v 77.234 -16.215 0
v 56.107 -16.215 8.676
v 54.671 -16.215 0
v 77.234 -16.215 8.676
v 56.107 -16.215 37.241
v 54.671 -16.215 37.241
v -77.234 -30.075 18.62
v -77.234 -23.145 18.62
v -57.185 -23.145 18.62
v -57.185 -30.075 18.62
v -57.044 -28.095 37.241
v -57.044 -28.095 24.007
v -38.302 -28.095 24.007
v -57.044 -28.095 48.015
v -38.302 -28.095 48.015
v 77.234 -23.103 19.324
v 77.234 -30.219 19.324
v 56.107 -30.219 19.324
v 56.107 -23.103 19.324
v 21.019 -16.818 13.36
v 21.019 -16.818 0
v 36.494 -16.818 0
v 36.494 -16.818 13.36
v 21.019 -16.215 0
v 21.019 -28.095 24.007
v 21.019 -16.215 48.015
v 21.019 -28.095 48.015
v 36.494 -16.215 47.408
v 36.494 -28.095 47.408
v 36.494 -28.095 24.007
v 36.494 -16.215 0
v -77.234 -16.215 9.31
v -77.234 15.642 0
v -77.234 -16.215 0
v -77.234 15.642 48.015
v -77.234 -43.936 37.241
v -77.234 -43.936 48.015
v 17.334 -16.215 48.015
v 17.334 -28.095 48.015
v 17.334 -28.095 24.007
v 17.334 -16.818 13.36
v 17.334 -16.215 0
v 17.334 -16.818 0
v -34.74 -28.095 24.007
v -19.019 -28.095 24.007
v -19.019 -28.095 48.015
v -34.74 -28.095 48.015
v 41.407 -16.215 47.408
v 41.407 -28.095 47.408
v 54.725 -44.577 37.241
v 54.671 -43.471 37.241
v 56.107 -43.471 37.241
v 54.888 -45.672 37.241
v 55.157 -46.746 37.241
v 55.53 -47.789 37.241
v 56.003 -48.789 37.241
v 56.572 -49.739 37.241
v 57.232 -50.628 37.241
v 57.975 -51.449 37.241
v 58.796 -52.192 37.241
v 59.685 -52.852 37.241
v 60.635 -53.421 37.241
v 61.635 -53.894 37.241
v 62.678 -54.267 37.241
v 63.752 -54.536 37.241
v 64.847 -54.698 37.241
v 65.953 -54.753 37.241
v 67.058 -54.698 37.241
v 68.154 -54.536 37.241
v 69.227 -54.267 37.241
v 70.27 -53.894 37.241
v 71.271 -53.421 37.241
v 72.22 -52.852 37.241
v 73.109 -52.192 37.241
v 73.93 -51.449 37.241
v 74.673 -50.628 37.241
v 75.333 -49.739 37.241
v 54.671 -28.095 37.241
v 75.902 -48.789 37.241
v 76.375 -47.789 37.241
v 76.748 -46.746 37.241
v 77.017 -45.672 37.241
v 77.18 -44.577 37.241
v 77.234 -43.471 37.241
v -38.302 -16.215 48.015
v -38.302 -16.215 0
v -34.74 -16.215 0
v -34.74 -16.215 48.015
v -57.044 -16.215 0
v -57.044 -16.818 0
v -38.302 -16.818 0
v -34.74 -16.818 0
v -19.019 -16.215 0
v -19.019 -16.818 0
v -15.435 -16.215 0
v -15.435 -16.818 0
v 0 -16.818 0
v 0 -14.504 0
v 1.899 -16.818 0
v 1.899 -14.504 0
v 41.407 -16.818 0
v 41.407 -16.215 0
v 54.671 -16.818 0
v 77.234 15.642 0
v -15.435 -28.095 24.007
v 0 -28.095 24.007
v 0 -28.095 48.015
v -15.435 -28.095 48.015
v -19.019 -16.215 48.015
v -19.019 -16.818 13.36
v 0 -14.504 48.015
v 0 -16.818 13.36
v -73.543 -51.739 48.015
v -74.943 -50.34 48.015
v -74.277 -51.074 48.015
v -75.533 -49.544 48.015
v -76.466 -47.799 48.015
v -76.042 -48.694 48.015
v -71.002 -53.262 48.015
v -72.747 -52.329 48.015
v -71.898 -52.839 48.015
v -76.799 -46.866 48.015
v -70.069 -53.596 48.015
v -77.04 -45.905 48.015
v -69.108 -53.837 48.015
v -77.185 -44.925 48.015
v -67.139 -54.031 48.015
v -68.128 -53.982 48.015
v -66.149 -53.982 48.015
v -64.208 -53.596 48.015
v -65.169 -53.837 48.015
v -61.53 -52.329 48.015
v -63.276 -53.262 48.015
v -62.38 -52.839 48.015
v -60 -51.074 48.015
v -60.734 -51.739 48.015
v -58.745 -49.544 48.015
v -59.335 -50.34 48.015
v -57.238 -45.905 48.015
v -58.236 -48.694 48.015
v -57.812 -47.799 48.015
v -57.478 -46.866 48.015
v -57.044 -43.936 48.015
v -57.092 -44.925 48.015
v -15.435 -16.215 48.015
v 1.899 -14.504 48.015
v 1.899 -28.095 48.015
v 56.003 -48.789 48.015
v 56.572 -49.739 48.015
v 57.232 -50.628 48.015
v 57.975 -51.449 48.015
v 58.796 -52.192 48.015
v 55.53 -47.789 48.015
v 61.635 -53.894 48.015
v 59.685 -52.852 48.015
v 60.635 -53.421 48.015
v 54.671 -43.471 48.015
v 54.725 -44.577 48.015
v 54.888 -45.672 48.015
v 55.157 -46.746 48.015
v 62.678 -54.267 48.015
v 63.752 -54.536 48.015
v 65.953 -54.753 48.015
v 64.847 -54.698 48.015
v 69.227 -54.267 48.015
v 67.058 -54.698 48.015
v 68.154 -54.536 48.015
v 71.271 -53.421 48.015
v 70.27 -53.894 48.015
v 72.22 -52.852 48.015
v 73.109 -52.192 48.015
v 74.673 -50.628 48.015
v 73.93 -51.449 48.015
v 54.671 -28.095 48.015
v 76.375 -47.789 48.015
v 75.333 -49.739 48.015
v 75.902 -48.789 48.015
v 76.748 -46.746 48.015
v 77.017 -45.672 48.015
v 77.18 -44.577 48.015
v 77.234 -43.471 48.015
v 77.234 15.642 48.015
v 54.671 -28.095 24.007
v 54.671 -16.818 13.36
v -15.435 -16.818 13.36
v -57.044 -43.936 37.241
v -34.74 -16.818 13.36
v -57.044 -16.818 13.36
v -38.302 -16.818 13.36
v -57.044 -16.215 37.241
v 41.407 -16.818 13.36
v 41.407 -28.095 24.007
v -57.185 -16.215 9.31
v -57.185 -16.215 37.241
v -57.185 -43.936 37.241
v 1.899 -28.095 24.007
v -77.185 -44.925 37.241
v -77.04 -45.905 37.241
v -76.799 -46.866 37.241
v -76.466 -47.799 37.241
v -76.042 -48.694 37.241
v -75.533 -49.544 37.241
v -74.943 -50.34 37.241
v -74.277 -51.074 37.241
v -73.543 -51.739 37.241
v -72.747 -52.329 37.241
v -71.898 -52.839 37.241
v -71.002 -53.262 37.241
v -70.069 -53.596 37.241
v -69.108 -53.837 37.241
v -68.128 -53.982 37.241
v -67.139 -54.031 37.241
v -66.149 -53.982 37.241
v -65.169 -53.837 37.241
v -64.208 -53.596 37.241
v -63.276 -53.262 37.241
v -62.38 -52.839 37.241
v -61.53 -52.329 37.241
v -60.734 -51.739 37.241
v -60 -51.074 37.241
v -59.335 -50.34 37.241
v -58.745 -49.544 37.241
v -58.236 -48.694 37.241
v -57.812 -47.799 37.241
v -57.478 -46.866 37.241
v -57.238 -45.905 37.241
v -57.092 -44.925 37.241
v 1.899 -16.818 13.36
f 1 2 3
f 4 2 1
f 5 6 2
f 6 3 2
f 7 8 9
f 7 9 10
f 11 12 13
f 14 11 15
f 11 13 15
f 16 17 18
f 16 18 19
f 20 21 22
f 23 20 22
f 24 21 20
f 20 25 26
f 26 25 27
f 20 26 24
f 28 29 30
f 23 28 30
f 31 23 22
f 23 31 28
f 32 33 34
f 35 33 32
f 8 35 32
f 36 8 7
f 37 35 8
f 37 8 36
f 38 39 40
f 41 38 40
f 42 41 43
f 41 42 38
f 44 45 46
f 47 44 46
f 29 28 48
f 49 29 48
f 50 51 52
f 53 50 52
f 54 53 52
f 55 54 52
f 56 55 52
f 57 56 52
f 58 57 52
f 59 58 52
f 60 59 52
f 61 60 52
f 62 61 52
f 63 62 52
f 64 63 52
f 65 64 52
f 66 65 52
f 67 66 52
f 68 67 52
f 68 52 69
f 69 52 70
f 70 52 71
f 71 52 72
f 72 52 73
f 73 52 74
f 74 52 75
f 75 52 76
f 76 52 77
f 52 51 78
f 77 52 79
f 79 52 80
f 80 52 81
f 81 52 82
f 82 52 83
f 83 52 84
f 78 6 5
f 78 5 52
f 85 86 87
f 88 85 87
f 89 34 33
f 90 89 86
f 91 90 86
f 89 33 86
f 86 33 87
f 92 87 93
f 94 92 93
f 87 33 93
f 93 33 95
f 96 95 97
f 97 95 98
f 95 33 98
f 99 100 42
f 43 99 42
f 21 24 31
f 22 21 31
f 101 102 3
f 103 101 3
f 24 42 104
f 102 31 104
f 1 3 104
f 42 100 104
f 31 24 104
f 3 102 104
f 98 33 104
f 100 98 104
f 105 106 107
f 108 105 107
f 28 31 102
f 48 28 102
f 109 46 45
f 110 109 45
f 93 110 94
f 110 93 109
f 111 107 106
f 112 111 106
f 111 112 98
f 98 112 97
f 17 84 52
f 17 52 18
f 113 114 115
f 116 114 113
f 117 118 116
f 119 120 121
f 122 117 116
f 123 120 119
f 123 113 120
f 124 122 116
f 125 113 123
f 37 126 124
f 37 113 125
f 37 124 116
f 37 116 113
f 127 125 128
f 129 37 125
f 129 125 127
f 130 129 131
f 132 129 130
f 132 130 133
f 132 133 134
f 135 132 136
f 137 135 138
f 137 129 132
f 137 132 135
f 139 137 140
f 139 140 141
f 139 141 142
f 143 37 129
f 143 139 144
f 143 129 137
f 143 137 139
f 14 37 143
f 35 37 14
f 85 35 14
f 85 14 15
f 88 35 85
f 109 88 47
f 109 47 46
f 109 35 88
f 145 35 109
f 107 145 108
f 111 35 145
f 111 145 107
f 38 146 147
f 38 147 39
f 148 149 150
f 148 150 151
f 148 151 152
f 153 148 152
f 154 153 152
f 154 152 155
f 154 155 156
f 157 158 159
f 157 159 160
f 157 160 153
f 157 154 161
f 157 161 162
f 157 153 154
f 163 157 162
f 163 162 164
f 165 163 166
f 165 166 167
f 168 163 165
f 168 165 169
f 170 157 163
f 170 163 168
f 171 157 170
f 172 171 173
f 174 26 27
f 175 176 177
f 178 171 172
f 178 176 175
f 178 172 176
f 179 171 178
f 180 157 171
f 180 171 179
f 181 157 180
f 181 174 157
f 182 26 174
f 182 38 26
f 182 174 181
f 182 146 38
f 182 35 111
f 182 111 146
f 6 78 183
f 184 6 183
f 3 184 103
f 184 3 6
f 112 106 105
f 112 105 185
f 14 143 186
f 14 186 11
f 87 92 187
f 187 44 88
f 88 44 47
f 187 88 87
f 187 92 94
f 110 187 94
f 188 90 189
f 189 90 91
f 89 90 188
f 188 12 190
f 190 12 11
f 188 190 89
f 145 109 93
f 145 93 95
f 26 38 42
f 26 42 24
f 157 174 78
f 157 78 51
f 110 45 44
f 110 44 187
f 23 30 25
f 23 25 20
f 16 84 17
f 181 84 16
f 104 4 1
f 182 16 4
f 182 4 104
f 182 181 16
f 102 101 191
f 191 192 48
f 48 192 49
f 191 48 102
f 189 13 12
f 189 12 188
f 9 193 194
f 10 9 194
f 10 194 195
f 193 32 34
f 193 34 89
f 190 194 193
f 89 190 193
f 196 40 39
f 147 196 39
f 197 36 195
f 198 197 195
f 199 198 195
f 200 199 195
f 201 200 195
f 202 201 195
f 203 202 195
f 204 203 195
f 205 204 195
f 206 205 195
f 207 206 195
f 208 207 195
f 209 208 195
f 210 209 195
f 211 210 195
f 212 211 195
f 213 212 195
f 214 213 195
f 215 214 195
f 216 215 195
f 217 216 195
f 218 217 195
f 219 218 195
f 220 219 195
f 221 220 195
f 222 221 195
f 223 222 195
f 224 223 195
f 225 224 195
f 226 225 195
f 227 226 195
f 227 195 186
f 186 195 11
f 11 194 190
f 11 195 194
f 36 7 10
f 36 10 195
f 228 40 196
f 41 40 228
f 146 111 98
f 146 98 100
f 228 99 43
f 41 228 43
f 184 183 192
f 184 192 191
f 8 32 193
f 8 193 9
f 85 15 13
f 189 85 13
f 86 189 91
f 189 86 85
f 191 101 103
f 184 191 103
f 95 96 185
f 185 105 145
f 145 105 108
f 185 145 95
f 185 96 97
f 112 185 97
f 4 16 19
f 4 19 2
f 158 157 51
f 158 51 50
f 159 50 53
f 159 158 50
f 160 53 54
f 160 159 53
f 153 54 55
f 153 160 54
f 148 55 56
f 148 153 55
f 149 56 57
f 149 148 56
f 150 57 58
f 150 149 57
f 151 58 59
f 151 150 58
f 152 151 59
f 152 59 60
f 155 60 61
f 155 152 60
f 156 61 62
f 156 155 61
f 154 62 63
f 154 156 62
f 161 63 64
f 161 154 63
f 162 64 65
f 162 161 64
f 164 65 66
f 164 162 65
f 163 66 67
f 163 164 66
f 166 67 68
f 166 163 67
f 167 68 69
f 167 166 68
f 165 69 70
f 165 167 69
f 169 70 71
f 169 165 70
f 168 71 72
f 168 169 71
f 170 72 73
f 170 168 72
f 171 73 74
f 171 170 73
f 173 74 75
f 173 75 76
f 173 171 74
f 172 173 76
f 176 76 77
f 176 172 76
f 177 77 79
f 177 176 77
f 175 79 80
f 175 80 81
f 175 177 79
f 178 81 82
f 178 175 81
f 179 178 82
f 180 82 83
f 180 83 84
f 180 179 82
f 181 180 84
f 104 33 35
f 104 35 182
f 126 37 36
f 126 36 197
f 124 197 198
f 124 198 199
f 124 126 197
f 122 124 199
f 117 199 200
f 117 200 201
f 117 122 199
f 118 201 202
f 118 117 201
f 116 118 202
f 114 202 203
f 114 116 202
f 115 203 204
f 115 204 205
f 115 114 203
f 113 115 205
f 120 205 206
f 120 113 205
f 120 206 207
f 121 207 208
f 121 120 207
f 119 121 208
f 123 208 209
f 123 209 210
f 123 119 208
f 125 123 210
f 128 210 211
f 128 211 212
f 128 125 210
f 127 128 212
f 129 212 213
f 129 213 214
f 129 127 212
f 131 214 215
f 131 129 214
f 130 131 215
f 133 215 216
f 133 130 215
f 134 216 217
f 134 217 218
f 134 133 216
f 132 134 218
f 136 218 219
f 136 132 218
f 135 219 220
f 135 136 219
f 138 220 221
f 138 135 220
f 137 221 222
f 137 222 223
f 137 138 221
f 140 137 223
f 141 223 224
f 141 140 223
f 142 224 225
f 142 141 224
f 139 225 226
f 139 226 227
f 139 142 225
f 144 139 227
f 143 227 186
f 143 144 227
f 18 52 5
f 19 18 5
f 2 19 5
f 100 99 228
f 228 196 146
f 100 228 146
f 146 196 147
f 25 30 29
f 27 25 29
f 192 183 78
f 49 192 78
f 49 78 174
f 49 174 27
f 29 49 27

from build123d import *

# Parameters (mm, degrees)
F0_W      = 154.4681414962
F0_H      = 32.4599891901
F1_DEPTH  = 48.0146426708
F2_W      = 11.2775340676
F2_H      = 24.0073213354
F3_DEPTH  = 154.6795647591
F4_W      = 20.4018931836
F4_H      = 24.0073213354
F4_W_2    = 3.5617277026
F4_W_3    = 3.5835206509
F4_W_4    = 3.6845356226
F4_W_5    = 4.9127191305
F4_W_6    = 22.562906146
F4_H_2    = 23.4004920349
F5_DEPTH  = 11.8805598468
F7_DEPTH  = 10.7736643404
F9_DEPTH  = 20.0494788587
F11_DEPTH = 21.1268346757
F12_W     = 1.8992722034
F12_H     = 24.0073213354
F13_DEPTH = 13.5909728706


with BuildPart() as f1:
    # F0 (on Top) → F1 (new body)
    with BuildSketch(Plane.XY):
        with Locations((3.7253e-06, -0.5876496434)):
            Rectangle(F0_W, F0_H)
    extrude(amount=F1_DEPTH)

    # F2 (on face) → F3 (join)
    with BuildSketch(Plane.YZ.offset(77.2340744734)):
        with Locations((-22.4564112723, 36.0109820031)):
            Rectangle(F2_W, F2_H)
        Polygon((-16.8176442385, 13.3598086642), (-16.8176442385, 24.0073213354), (-28.0951783061, 24.0073213354), align=None)
    extrude(amount=-F3_DEPTH)

    # F4 (on face) → F5 (cut)
    with BuildSketch(Plane.XZ.offset(28.0951783061)):
        with Locations((-67.244543694, 12.0036606677)):
            Rectangle(F4_W, F4_H)
        with Locations((-67.244543694, 36.0109820031)):
            Rectangle(F4_W, F4_H)
        with Locations((-36.5212969482, 12.0036606677)):
            Rectangle(F4_W_2, F4_H)
        with Locations((-36.5212969482, 36.0109820031)):
            Rectangle(F4_W_2, F4_H)
        with Locations((-17.2269493341, 36.0109820031)):
            Rectangle(F4_W_3, F4_H)
        with Locations((-17.2269493341, 12.0036606677)):
            Rectangle(F4_W_3, F4_H)
        with Locations((19.1767290235, 36.0109820031)):
            Rectangle(F4_W_4, F4_H)
        with Locations((19.1767290235, 12.0036606677)):
            Rectangle(F4_W_4, F4_H)
        with Locations((38.9504507184, 12.0036606677)):
            Rectangle(F4_W_5, F4_H)
        with Locations((65.9526214004, 36.0109820031)):
            Rectangle(F4_W_6, F4_H)
        with Locations((65.9526214004, 12.0036606677)):
            Rectangle(F4_W_6, F4_H)
        with Locations((38.9504507184, 35.7075673528)):
            Rectangle(F4_W_5, F4_H_2)
    extrude(amount=-F5_DEPTH, mode=Mode.SUBTRACT)

    # F6 (on face) → F7 (join)
    with BuildSketch(Plane.XY.offset(48.0146426708)):
        Polygon((-57.0435971022, -16.2146184593), (-77.2340670228, -16.2146184593), (-77.2340670228, -43.9355224371), (-57.0435971022, -43.9355224371), (-57.0435971022, -28.0951783061), align=None)
        with BuildLine():
            Line((-57.0435971022, -43.9355224371), (-77.2340670228, -43.9355224371))
            ThreePointArc((-77.2340670228, -43.9355224371), (-67.1388320625, -54.0307573974), (-57.0435971022, -43.9355224371))
        make_face()
        Polygon((77.2340744734, -43.4713661671), (77.2340744734, -16.2146184593), (54.6711683273, -16.2146184593), (54.6711683273, -28.0951783061), (54.6711683273, -43.4713661671), align=None)
        with BuildLine():
            ThreePointArc((54.6711683273, -43.4713661671), (65.9526214004, -54.7528192401), (77.2340744734, -43.4713661671))
            Line((77.2340744734, -43.4713661671), (54.6711683273, -43.4713661671))
        make_face()
    extrude(amount=-F7_DEPTH)

    # F8 (on face) → F9 (join)
    with BuildSketch(Plane(origin=(-77.2340670228, 0, 0), x_dir=(0, -1, 0), z_dir=(-1, 0, 0))):
        Polygon((30.0750704482, 18.6204891652), (43.9355224371, 37.2409783304), (16.2146184593, 37.2409783304), (16.2146184593, 18.6204891652), (23.1448444538, 18.6204891652), align=None)
        Polygon((16.2146184593, 9.3102445826), (23.1448444538, 18.6204891652), (16.2146184593, 18.6204891652), align=None)
    extrude(amount=-F9_DEPTH)

    # F10 (on face) → F11 (join)
    with BuildSketch(Plane.YZ.offset(77.2340744734)):
        Polygon((-16.2146184593, 37.2409783304), (-43.4713661671, 37.2409783304), (-30.2190445364, 19.3241238594), (-23.1028571725, 19.3241238594), (-16.2146184593, 8.6756854873), align=None)
    extrude(amount=-F11_DEPTH)

    # F12 (on face) → F13 (cut)
    with BuildSketch(Plane.XZ.offset(28.0951783061)):
        with Locations((0.9496361017, 36.0109820031)):
            Rectangle(F12_W, F12_H)
        with Locations((0.9496361017, 12.0036606677)):
            Rectangle(F12_W, F12_H)
    extrude(amount=-F13_DEPTH, mode=Mode.SUBTRACT)


solid = f1.part
